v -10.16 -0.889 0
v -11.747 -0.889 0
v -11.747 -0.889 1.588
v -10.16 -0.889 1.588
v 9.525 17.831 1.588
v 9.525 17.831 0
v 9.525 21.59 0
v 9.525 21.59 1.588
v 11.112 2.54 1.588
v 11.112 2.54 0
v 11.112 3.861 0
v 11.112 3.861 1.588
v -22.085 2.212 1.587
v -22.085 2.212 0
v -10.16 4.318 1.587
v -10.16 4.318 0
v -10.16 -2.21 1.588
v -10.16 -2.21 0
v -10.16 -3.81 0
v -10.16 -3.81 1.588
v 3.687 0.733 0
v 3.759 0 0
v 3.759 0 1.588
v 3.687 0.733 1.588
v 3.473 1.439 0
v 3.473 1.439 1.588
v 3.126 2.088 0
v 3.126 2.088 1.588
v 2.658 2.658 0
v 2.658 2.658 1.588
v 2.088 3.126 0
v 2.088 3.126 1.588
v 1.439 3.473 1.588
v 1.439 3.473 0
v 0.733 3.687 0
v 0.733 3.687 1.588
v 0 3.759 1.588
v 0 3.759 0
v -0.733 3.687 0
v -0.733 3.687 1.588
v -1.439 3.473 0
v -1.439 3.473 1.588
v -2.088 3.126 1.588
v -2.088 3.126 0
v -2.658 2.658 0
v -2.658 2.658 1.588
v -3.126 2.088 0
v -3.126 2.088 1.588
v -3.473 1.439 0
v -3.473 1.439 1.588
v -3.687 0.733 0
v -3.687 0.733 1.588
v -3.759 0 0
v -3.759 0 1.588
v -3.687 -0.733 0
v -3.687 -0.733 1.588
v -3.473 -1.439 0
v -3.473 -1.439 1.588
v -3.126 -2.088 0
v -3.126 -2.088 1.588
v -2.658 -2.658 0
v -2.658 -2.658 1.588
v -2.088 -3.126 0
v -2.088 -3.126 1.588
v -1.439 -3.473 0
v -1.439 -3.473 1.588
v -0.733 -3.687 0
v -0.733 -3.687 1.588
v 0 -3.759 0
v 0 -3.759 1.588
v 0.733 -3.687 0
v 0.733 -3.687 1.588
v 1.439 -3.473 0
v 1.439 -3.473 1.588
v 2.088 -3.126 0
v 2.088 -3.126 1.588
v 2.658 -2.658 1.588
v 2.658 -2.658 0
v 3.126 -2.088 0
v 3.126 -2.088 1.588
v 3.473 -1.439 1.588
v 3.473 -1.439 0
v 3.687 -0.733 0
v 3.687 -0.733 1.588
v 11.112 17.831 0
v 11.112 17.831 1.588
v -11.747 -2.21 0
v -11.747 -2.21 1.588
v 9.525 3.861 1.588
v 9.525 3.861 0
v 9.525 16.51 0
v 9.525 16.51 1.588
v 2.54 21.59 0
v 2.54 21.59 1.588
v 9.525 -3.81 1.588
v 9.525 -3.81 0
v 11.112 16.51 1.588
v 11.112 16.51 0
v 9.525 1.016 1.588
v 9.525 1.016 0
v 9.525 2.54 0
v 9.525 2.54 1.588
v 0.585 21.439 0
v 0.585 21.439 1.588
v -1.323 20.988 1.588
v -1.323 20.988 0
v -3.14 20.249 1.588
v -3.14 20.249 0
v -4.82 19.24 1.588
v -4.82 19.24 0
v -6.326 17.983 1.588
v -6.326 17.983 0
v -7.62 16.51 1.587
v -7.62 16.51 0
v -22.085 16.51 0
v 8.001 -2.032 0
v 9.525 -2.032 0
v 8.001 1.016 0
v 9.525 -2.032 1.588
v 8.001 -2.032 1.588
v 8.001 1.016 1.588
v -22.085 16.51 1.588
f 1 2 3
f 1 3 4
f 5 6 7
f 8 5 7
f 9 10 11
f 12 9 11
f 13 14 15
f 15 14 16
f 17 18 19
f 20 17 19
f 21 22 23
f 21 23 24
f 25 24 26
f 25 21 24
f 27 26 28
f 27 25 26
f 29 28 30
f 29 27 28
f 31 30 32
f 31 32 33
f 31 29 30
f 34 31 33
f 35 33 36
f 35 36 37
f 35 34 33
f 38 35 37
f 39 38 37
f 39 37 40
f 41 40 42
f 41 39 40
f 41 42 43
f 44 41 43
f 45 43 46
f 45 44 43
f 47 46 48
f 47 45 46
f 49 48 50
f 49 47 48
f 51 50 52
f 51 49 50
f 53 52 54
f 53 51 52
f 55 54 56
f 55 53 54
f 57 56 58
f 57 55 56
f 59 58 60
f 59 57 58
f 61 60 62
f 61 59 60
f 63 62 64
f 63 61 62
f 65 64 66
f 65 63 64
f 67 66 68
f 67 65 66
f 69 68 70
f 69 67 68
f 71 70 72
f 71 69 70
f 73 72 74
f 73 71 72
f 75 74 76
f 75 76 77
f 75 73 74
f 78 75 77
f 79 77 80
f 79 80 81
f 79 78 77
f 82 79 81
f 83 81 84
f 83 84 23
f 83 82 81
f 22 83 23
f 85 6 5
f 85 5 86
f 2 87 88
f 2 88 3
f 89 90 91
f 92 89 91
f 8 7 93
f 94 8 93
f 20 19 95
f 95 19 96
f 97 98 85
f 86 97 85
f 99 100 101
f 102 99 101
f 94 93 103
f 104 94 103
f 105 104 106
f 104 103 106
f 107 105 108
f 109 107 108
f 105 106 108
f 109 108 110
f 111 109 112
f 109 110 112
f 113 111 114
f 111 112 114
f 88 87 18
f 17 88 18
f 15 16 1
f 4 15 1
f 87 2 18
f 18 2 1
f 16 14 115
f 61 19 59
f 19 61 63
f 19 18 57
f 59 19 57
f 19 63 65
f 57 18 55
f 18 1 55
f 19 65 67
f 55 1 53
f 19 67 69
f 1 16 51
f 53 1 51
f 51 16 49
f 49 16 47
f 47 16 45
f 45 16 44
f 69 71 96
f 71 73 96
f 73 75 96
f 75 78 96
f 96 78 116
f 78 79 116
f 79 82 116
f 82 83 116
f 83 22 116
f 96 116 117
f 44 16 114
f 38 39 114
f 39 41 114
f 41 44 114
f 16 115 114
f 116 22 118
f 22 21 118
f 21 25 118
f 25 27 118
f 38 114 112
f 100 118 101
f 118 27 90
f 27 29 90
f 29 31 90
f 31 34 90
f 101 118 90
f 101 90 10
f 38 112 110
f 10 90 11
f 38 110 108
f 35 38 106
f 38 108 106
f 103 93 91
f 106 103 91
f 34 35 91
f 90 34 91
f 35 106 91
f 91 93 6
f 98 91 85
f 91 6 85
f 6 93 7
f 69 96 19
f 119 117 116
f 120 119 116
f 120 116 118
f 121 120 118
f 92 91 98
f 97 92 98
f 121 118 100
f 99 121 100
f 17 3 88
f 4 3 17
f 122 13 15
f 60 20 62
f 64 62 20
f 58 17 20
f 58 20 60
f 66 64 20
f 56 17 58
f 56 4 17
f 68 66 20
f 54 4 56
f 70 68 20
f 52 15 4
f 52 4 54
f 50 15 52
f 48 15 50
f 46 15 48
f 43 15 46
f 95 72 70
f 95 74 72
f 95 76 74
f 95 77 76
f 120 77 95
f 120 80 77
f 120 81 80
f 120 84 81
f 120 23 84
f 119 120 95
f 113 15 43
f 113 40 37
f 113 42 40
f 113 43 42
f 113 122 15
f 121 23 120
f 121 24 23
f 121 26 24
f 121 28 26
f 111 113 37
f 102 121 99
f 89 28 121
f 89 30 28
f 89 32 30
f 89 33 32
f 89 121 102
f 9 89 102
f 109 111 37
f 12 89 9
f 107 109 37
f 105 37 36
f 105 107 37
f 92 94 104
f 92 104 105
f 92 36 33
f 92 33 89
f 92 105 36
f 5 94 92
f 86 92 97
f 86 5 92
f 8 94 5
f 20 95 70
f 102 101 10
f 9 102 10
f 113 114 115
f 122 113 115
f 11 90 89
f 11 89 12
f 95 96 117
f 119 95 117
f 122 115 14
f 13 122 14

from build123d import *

# Parameters (mm, degrees)
SKETCH1_R           = 3.7592
SKETCH1_W           = 1.5875
SKETCH1_H           = 1.3208
BOSS_EXTRUDE1_DEPTH = 1.5875


with BuildPart() as part:
    # Sketch1 → Boss-Extrude1 (new body)
    # profile 1 of 6: a face of its own
    with BuildSketch(Plane.XY):
        with BuildLine():
            ThreePointArc((2.54, 21.59), (-3.139612663, 20.249225326), (-7.62, 16.51))
            ThreePointArc((-7.62, 16.51), (-9.508277885, 12.906092628), (-10.16, 8.89))
            Line((-10.16, 8.89), (-10.16, 4.318))
            Line((-10.16, 4.318), (-10.16, -0.889))
            Line((-10.16, -0.889), (-10.16, -2.2098))
            Line((-10.16, -2.2098), (-10.16, -3.81))
            Line((-10.16, -3.81), (9.525, -3.81))
            Line((9.525, -3.81), (9.525, -2.032))
            Line((9.525, -2.032), (8.001, -2.032))
            Line((8.001, -2.032), (8.001, 1.016))
            Line((8.001, 1.016), (9.525, 1.016))
            Line((9.525, 1.016), (9.525, 2.54))
            Line((9.525, 2.54), (9.525, 3.8608))
            Line((9.525, 3.8608), (9.525, 16.51))
            Line((9.525, 16.51), (9.525, 17.8308))
            Line((9.525, 17.8308), (9.525, 21.59))
            Line((9.525, 21.59), (2.54, 21.59))
        make_face()
        Circle(SKETCH1_R, mode=Mode.SUBTRACT)
    # profile 2 of 6: a face of its own
    with BuildSketch(Plane.XY):
        with Locations((-10.95375, -1.5494)):
            Rectangle(SKETCH1_W, SKETCH1_H)
    # profile 3 of 6: a face of its own
    with BuildSketch(Plane.XY):
        with Locations((10.31875, 17.1704)):
            Rectangle(SKETCH1_W, SKETCH1_H)
    # profile 4 of 6: a face of its own
    with BuildSketch(Plane.XY):
        with Locations((10.31875, 3.2004)):
            Rectangle(SKETCH1_W, SKETCH1_H)
    # profile 5 of 6: a face of its own
    with BuildSketch(Plane.XY):
        with BuildLine():
            ThreePointArc((-10.16, 8.89), (-9.508277885, 12.906092628), (-7.62, 16.51))
            Line((-7.62, 16.51), (-22.084921519, 16.51))
            Line((-22.084921519, 16.51), (-22.084921519, 13.081))
            Line((-22.084921519, 13.081), (-22.084921519, 4.699))
            Line((-22.084921519, 4.699), (-22.084921519, 2.212007412))
            Line((-22.084921519, 2.212007412), (-10.16, 4.318))
            Line((-10.16, 4.318), (-10.16, 8.89))
        make_face()
    # profile 6 of 6: a face of its own
    with BuildSketch(Plane.XY):
        with BuildLine():
            ThreePointArc((-10.16, 8.89), (-9.508277885, 12.906092628), (-7.62, 16.51))
            Line((-7.62, 16.51), (-22.084921519, 16.51))
            Line((-22.084921519, 16.51), (-22.084921519, 13.081))
            Line((-22.084921519, 13.081), (-22.084921519, 4.699))
            Line((-22.084921519, 4.699), (-22.084921519, 2.212007412))
            Line((-22.084921519, 2.212007412), (-10.16, 4.318))
            Line((-10.16, 4.318), (-10.16, 8.89))
        make_face()
    extrude(amount=BOSS_EXTRUDE1_DEPTH)


solid = part.part
